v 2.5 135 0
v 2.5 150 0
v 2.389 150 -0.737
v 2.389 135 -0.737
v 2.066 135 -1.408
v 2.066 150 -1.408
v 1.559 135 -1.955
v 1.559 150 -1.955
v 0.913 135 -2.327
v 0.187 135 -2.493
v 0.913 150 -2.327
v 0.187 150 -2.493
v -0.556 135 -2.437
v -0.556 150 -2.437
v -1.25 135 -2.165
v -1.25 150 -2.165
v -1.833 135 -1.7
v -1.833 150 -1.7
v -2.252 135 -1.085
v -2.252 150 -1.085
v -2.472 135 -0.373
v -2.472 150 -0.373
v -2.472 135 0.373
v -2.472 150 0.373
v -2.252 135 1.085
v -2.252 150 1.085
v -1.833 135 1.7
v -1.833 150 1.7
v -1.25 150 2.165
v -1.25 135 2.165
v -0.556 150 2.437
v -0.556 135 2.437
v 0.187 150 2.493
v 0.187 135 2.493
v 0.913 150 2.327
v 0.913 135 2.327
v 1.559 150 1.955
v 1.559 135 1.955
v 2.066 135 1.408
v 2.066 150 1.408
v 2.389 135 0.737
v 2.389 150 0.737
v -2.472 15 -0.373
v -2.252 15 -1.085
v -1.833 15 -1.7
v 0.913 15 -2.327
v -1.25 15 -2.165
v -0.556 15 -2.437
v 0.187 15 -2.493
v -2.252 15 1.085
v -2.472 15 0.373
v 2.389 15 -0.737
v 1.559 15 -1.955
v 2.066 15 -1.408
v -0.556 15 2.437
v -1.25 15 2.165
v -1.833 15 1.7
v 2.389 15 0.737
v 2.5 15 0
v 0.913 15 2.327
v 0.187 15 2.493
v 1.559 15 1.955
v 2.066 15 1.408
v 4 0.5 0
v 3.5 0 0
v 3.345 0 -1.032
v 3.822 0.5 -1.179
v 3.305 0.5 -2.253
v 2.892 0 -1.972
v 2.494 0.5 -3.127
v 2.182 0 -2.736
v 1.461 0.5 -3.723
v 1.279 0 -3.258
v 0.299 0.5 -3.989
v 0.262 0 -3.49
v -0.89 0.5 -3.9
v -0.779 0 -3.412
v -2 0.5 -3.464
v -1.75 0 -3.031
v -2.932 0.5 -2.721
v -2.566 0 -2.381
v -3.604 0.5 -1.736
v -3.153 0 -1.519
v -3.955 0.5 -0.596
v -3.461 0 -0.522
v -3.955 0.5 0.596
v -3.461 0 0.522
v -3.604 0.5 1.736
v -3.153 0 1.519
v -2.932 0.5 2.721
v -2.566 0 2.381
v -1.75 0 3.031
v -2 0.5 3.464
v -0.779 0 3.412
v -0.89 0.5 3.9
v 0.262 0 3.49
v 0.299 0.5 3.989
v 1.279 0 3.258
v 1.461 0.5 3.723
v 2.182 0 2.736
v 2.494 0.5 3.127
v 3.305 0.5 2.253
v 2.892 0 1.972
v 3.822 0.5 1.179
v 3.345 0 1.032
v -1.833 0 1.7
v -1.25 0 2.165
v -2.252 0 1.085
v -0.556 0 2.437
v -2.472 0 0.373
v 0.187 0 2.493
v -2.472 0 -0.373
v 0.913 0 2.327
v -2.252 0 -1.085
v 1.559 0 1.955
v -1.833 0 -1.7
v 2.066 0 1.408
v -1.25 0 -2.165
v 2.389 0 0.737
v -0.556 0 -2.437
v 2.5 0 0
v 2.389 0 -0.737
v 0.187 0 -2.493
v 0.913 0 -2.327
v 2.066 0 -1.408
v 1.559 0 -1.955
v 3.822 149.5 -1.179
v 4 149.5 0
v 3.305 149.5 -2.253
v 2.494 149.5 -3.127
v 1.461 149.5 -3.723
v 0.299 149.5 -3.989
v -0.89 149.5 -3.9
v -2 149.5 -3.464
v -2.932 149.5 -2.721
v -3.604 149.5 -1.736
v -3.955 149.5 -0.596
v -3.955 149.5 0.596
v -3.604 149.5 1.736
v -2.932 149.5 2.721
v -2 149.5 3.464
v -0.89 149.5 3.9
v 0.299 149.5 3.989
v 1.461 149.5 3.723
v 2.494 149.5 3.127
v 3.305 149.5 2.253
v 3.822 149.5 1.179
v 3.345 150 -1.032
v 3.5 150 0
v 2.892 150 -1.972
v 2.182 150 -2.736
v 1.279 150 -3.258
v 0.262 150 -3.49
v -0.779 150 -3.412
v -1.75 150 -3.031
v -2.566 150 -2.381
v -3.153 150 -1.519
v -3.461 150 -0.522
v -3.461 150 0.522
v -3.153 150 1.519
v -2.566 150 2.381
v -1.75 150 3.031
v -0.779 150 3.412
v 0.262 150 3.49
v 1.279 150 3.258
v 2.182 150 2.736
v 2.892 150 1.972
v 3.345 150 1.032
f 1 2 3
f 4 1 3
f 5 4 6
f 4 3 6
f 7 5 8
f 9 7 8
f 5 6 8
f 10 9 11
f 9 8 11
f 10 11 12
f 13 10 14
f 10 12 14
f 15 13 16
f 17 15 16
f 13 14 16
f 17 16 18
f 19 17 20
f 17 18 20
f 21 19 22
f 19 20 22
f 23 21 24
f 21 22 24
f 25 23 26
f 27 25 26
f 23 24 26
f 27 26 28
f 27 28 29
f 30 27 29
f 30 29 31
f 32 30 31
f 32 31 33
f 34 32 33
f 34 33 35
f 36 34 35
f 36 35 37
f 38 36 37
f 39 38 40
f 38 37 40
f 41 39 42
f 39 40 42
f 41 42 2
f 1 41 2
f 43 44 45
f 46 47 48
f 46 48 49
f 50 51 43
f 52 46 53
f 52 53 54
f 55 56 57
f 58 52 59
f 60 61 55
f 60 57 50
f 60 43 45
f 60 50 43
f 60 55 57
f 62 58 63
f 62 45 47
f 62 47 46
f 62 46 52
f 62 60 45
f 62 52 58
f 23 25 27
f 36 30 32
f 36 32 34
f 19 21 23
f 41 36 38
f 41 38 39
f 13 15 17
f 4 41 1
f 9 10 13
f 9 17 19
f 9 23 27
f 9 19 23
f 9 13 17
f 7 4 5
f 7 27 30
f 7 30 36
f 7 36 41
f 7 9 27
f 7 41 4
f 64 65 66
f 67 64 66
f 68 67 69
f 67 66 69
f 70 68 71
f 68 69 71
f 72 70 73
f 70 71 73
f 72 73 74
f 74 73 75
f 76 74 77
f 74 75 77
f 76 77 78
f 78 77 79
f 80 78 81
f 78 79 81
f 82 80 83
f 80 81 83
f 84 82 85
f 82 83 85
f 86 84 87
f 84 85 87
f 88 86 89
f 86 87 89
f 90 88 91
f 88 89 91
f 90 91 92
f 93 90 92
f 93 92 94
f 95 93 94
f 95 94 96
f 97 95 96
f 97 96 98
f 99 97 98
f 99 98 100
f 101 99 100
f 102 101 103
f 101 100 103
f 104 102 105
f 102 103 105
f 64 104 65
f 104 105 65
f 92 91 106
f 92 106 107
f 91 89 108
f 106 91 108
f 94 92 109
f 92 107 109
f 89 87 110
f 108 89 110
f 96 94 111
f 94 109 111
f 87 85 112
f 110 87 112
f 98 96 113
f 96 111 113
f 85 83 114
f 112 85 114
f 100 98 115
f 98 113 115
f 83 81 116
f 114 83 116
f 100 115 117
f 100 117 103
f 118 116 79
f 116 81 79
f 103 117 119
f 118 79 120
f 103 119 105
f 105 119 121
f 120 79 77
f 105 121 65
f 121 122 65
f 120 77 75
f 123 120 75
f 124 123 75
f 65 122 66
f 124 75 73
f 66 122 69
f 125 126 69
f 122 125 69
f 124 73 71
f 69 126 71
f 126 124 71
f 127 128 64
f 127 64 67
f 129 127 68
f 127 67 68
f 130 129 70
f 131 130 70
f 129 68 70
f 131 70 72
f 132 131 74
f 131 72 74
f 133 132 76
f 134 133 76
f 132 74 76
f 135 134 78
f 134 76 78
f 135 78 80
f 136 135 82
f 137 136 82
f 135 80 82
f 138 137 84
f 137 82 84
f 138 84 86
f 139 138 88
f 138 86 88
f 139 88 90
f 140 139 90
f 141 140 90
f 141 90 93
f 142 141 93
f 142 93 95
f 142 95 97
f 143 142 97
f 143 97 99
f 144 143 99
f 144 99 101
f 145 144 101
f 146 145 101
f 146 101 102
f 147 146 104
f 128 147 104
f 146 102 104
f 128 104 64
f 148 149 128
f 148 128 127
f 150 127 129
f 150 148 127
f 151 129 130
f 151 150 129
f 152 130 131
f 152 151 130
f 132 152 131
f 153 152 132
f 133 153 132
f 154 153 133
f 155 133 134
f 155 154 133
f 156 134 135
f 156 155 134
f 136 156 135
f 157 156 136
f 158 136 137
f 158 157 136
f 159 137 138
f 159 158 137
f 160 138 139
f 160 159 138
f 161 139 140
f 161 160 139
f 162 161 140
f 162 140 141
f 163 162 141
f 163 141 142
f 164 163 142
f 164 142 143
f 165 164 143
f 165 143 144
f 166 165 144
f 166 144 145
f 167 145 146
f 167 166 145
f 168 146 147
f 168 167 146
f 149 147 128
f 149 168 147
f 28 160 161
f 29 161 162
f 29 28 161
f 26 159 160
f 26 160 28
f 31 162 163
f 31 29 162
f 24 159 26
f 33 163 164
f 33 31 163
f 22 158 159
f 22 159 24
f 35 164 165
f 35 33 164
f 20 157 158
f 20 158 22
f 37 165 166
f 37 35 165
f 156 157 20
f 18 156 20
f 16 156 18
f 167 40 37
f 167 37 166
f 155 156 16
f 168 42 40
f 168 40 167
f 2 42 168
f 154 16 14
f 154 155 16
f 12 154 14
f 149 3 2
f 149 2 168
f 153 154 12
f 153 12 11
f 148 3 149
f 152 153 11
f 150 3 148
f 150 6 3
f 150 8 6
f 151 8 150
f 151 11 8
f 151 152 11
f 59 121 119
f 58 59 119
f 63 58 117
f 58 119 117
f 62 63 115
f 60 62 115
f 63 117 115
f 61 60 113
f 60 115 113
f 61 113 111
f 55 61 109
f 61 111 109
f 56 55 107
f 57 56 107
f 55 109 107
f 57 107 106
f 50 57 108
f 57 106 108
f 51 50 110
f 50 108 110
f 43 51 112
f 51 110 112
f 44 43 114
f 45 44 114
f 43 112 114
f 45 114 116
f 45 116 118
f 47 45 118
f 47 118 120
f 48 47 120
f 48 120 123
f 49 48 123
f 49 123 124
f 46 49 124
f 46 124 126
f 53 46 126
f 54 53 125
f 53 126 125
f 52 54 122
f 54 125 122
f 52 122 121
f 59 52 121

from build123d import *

# Parameters (mm, degrees)
ESQUISSE1_R      = 4
EXTRUSION1_DEPTH = 150
CHANFREIN1_SIZE  = 0.5
ESQUISSE2_R      = 2.5
EXTRUSION2_DEPTH = 15
ESQUISSE3_R      = 2.5
EXTRUSION3_DEPTH = 15


with BuildPart() as part:
    # Esquisse1 → Extrusion1 (new body)
    with BuildSketch(Plane(origin=(0, 0, 0), x_dir=(1, 0, 0), z_dir=(0, 1, 0))):
        Circle(ESQUISSE1_R)
    extrude(amount=EXTRUSION1_DEPTH)

    # Chanfrein1
    chanfrein1_edges = [part.edges().sort_by_distance(p)[0] for p in [
        (-4, 0, 0),
        (-4, 150, 0),
    ]]
    chamfer(chanfrein1_edges, length=CHANFREIN1_SIZE)

    # Esquisse2 → Extrusion2 (cut)
    with BuildSketch(Plane.XZ):
        Circle(ESQUISSE2_R)
    extrude(amount=-EXTRUSION2_DEPTH, mode=Mode.SUBTRACT)

    # Esquisse3 → Extrusion3 (cut)
    with BuildSketch(Plane(origin=(0, 150, 0), x_dir=(1, 0, 0), z_dir=(0, 1, 0))):
        Circle(ESQUISSE3_R)
    extrude(amount=-EXTRUSION3_DEPTH, mode=Mode.SUBTRACT)


solid = part.part
